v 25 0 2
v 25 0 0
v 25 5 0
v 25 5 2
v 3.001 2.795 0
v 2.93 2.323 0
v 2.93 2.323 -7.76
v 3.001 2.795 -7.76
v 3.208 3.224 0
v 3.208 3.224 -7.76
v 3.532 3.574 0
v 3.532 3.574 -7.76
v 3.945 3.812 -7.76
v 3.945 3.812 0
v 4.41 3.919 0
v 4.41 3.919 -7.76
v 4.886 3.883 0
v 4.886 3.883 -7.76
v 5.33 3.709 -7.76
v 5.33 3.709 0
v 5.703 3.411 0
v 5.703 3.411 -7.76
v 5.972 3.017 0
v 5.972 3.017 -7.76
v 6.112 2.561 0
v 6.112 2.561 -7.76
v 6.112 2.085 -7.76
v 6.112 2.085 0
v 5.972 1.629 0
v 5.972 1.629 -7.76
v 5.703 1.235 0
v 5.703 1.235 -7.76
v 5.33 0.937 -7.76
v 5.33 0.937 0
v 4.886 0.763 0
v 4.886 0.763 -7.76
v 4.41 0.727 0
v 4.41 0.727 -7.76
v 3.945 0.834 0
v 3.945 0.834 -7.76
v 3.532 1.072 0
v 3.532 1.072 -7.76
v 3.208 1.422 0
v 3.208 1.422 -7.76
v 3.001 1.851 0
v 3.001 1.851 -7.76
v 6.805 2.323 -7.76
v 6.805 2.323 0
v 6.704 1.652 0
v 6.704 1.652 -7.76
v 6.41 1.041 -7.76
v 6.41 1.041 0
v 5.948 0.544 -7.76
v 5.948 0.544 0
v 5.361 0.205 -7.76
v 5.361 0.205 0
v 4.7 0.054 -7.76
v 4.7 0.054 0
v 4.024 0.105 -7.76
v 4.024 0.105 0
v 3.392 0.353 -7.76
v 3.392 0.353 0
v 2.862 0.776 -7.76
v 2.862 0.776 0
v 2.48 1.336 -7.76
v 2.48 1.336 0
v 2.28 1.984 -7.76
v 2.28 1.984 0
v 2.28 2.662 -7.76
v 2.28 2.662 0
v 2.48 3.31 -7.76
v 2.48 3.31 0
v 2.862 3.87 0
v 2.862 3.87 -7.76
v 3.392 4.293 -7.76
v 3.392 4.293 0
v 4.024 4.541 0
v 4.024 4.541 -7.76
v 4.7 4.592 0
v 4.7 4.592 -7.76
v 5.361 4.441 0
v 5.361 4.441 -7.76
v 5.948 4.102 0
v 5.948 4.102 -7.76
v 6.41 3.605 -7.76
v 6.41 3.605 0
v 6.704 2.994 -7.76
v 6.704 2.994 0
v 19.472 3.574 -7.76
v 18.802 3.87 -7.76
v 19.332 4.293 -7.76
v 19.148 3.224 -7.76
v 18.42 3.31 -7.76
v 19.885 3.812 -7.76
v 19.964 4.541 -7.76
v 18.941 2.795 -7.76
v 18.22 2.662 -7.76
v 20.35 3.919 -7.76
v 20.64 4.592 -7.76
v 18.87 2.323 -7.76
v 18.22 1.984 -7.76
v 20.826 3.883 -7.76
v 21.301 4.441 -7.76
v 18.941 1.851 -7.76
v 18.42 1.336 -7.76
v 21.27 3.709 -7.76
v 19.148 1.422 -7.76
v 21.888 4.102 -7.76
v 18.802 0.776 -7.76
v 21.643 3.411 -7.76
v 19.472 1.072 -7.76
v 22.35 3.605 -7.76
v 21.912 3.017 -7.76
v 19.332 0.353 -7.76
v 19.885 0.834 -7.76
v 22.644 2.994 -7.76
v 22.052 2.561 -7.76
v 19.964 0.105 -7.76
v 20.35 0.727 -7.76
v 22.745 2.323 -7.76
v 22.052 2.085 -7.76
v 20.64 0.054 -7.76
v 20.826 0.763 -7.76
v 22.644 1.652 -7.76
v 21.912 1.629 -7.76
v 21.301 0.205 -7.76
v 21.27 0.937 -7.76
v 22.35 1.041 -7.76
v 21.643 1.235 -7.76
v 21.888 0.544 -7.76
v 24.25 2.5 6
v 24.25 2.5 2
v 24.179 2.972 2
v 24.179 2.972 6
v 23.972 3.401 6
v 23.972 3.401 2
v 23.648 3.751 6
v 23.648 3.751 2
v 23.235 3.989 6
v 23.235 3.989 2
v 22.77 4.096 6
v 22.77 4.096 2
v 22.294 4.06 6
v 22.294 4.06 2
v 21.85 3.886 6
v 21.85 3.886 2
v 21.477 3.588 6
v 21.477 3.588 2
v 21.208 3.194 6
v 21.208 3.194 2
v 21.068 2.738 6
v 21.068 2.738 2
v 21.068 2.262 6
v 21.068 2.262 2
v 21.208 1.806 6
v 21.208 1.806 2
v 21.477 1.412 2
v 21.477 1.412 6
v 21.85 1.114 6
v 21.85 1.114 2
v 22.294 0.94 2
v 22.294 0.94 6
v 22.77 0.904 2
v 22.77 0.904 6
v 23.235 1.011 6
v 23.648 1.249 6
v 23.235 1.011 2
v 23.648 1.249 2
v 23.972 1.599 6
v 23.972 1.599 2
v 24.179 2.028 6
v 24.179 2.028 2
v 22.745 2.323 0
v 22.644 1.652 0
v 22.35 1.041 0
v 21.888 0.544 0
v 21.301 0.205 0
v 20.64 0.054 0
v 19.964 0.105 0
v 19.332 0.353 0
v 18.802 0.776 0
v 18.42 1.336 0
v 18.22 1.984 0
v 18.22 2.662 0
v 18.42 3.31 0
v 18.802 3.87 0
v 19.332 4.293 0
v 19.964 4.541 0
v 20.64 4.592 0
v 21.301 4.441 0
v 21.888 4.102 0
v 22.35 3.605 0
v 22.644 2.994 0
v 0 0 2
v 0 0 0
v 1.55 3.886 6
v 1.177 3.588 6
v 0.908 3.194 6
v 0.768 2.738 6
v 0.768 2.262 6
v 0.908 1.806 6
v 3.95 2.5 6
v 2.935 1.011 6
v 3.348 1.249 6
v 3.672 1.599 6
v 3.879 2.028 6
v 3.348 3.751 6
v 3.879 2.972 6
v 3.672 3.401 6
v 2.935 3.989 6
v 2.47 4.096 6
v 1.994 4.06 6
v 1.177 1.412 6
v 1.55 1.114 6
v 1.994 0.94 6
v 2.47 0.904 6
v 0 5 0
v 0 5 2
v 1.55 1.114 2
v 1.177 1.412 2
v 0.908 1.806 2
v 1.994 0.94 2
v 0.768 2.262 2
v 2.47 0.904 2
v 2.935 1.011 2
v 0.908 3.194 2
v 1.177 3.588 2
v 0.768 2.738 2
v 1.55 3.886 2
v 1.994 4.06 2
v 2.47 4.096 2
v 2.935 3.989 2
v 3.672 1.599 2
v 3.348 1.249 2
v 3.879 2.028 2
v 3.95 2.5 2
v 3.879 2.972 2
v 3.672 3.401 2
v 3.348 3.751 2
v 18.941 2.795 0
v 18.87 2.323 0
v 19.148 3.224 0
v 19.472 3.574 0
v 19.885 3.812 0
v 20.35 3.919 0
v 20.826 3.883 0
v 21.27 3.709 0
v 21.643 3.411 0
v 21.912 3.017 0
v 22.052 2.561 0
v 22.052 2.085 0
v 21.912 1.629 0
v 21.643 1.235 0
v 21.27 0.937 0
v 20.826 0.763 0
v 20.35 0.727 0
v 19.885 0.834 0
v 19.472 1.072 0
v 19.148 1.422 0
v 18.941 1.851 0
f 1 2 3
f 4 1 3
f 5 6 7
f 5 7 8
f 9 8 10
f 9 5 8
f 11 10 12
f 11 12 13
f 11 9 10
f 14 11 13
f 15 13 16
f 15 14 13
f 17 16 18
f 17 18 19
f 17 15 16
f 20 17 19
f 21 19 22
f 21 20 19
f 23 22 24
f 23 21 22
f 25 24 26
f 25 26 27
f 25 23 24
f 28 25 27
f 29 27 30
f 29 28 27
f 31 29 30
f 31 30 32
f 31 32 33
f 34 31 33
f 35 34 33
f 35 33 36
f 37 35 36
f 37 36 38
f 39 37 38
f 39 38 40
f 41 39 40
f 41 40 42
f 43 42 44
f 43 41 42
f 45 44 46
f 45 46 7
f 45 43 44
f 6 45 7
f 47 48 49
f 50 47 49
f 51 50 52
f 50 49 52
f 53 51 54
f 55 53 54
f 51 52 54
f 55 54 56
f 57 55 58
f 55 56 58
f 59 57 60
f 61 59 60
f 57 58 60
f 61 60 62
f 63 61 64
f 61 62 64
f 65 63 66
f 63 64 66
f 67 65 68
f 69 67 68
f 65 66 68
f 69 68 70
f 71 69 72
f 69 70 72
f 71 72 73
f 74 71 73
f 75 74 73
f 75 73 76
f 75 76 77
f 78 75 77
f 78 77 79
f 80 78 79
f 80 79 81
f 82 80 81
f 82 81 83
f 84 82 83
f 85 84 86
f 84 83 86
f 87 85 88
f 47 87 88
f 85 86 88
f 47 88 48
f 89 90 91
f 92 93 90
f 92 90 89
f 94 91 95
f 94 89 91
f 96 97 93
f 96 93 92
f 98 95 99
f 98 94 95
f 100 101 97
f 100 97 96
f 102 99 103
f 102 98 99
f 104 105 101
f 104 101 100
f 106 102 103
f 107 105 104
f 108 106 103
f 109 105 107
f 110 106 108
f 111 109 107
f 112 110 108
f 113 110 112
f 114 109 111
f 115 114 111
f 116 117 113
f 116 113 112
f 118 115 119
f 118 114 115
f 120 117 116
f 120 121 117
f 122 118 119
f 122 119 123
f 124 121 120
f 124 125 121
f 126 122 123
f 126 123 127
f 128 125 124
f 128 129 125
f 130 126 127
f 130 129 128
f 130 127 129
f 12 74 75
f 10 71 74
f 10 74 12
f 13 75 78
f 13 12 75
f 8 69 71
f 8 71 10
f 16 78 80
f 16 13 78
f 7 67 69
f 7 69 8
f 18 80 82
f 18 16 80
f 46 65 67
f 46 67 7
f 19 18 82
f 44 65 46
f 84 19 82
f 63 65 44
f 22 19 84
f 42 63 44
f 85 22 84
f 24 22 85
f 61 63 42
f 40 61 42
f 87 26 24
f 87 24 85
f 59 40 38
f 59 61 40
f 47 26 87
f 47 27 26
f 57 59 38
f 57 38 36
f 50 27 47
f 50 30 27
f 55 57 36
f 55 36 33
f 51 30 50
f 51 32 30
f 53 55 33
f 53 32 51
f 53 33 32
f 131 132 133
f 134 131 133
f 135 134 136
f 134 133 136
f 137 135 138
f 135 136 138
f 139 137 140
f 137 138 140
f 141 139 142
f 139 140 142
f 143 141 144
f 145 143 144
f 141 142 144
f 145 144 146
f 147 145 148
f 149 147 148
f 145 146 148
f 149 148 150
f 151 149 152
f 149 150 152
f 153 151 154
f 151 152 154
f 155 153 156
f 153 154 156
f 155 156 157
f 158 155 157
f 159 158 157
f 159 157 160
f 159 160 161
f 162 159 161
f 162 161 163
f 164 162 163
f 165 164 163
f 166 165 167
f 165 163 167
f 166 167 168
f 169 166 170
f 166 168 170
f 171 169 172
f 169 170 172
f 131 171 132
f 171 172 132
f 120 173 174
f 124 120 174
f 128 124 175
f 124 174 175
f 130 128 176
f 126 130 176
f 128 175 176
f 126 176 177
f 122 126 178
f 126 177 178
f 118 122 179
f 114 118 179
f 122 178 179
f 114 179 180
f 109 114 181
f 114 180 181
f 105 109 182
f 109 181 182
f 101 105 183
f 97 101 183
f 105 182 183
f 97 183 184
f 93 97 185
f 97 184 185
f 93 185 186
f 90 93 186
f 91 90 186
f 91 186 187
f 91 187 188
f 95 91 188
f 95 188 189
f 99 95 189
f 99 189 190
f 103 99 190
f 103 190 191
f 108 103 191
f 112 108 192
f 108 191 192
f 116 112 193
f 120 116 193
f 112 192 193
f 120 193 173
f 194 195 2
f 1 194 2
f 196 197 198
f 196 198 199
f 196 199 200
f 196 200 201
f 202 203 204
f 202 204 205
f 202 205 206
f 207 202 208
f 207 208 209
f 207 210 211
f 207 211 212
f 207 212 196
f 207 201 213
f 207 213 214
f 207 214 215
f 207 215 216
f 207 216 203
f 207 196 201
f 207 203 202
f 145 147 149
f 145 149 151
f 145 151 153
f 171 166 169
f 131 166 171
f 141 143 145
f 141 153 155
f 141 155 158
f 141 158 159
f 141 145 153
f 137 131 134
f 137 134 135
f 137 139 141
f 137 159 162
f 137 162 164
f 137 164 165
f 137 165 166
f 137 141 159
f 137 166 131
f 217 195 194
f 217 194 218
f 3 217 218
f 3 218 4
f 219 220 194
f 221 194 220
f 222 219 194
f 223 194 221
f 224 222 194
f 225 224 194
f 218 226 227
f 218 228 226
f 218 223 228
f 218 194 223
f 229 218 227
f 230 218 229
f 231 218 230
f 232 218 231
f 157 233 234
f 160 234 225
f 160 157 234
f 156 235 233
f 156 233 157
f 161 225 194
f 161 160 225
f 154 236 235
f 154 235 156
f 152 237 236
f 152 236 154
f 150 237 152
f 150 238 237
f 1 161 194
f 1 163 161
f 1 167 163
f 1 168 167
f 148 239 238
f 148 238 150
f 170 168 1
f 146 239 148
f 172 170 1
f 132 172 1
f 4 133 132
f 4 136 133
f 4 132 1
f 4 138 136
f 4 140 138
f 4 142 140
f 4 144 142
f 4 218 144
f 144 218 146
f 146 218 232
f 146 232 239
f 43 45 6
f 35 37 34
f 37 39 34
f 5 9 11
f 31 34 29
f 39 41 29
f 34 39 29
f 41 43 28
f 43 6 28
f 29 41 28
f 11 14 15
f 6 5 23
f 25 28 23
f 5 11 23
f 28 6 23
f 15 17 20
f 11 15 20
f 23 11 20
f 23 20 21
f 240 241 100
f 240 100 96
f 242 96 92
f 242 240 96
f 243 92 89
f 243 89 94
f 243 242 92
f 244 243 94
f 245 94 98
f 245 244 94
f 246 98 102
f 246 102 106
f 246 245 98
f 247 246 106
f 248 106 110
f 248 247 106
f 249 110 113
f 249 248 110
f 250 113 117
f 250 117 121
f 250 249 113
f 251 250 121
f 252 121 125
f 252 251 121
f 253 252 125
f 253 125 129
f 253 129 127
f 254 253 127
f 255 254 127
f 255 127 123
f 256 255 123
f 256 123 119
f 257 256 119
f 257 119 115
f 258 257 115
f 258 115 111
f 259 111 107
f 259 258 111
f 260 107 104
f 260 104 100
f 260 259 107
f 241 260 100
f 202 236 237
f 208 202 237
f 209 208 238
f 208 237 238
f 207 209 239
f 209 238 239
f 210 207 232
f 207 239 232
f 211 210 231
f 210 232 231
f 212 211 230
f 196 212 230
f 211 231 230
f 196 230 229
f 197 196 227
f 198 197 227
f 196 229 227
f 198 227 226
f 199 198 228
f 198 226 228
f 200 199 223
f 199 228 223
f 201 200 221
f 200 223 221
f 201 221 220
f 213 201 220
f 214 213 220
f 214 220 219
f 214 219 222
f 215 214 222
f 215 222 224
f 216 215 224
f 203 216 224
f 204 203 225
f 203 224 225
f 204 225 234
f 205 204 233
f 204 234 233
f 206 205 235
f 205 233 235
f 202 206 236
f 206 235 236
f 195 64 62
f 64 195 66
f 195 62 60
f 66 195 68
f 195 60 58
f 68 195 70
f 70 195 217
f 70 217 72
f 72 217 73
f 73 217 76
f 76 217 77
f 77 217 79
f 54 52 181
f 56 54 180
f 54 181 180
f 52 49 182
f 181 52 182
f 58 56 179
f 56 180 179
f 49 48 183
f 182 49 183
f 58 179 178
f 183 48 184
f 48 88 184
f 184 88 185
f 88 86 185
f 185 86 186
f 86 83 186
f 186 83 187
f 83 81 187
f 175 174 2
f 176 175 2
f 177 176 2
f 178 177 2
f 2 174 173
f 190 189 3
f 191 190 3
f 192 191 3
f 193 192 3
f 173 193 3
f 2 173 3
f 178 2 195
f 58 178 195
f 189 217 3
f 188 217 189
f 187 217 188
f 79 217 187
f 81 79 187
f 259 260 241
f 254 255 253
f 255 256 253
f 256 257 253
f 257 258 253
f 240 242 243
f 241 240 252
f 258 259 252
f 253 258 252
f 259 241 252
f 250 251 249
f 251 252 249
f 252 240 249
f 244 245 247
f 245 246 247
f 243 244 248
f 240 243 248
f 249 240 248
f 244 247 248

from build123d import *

# Parameters (mm, degrees)
SKETCH1_W           = 25
SKETCH1_H           = 5
BOSS_EXTRUDE1_DEPTH = 2
SKETCH2_R           = 1.6
BOSS_EXTRUDE2_DEPTH = 4
SKETCH3_R           = 2.275
SKETCH3_R_2         = 1.6
BOSS_EXTRUDE3_DEPTH = 7.76


with BuildPart() as part:
    # Sketch1 → Boss-Extrude1 (new body)
    with BuildSketch(Plane.XY):
        with Locations((12.5, 2.5)):
            Rectangle(SKETCH1_W, SKETCH1_H)
    extrude(amount=BOSS_EXTRUDE1_DEPTH)

    # Sketch2 → Boss-Extrude2 (add)
    with BuildSketch(Plane.XY.offset(2)):
        with Locations((2.35, 2.5)):
            Circle(SKETCH2_R)
        with Locations((22.65, 2.5)):
            Circle(SKETCH2_R)
    extrude(amount=BOSS_EXTRUDE2_DEPTH)

    # Sketch3 → Boss-Extrude3 (add)
    # profile 1 of 2: a face of its own
    with BuildSketch(Plane(origin=(0, 0, 0), x_dir=(-1, 0, 0), z_dir=(0, 0, -1))):
        with Locations(Location((-20.47, 2.322974485, 0), (0, 0, 180))):
            Circle(SKETCH3_R)
        with Locations((-20.47, 2.322974485)):
            Circle(SKETCH3_R_2, mode=Mode.SUBTRACT)
    # profile 2 of 2: a face of its own
    with BuildSketch(Plane(origin=(0, 0, 0), x_dir=(-1, 0, 0), z_dir=(0, 0, -1))):
        with Locations(Location((-4.53, 2.322974485, 0), (0, 0, 180))):
            Circle(SKETCH3_R)
        with Locations((-4.53, 2.322974485)):
            Circle(SKETCH3_R_2, mode=Mode.SUBTRACT)
    extrude(amount=BOSS_EXTRUDE3_DEPTH)


solid = part.part
